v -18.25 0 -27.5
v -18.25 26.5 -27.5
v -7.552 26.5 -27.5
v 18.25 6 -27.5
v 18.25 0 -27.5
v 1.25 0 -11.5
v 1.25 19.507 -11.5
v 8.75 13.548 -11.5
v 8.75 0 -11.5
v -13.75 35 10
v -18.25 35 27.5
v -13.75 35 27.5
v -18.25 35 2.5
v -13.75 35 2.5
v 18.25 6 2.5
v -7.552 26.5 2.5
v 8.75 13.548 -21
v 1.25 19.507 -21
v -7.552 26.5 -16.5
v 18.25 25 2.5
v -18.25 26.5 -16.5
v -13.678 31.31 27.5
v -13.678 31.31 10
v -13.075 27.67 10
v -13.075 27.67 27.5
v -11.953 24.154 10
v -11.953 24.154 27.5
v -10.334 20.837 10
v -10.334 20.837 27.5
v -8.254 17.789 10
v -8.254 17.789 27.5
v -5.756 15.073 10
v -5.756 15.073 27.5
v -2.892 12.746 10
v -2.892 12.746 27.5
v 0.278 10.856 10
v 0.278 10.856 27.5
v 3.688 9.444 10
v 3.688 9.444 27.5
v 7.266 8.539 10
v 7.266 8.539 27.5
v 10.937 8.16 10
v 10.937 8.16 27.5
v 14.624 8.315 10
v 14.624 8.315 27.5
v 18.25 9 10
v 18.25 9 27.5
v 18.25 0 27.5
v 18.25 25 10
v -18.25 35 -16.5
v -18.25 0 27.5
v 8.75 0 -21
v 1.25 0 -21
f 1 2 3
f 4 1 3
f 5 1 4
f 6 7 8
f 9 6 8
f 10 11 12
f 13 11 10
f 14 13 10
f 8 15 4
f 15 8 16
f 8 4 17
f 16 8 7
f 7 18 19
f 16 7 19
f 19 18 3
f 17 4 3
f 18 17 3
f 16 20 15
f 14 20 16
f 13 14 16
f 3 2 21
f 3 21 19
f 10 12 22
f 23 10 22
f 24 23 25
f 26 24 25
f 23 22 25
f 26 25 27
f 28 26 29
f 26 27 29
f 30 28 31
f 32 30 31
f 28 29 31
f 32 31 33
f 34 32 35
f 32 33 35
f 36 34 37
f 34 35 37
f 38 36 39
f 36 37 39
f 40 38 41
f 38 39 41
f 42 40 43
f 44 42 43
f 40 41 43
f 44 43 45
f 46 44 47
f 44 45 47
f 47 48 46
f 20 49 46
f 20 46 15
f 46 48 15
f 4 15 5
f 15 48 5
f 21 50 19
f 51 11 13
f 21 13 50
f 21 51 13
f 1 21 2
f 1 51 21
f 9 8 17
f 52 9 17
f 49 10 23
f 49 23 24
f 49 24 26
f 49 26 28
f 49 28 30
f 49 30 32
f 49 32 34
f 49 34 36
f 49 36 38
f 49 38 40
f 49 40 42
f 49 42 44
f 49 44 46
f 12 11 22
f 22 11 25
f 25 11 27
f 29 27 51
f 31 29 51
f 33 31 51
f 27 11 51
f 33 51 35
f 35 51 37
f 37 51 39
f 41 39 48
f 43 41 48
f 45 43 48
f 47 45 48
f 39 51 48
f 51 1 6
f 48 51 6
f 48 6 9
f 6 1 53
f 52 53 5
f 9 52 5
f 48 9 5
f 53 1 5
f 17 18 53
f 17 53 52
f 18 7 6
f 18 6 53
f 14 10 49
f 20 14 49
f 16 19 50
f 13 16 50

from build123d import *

# Parameters (mm, degrees)
SKETCH1_W           = 36.5
SKETCH1_H           = 55
SKETCH1_W_2         = 7.5
SKETCH1_H_2         = 9.5
BOSS_EXTRUDE1_DEPTH = 35
SKETCH3_W           = 11
SKETCH3_H           = 11
CUT_EXTRUDE2_DEPTH  = 8.5
CUT_EXTRUDE1_DEPTH  = 30
CUT_EXTRUDE3_DEPTH  = 17.5
CUT_EXTRUDE4_REACH  = 39.5


with BuildPart() as part:
    # Sketch1 → Boss-Extrude1 (new body)
    with BuildSketch(Plane(origin=(0, 0, 0), x_dir=(1, 0, 0), z_dir=(0, 1, 0))):
        Rectangle(SKETCH1_W, SKETCH1_H)
        with Locations((5, 16.25)):
            Rectangle(SKETCH1_W_2, SKETCH1_H_2, mode=Mode.SUBTRACT)
    extrude(amount=BOSS_EXTRUDE1_DEPTH)

    # Sketch3 → Cut-Extrude2 (cut)
    with BuildSketch(Plane(origin=(0, 35, 0), x_dir=(1, 0, 0), z_dir=(0, 1, 0))):
        with Locations((-12.75, 22)):
            Rectangle(SKETCH3_W, SKETCH3_H)
    extrude(amount=-CUT_EXTRUDE2_DEPTH, mode=Mode.SUBTRACT)

    # Sketch2 → Cut-Extrude1 (cut)
    with BuildSketch(Plane(origin=(0, 0, -27.5), x_dir=(-1, 0, 0), z_dir=(0, 0, -1))):
        Polygon((7.551724138, 26.5), (18.25, 35), (7.25, 35), (7.25, 26.5), align=None)
        Polygon((-18.25, 6), (7.551724138, 26.5), (7.25, 26.5), (7.25, 35), (-18.25, 35), align=None)
    extrude(amount=-CUT_EXTRUDE1_DEPTH, mode=Mode.SUBTRACT)

    # Sketch4 → Cut-Extrude3 (cut)
    with BuildSketch(Plane.XY.offset(27.5)):
        with BuildLine():
            ThreePointArc((-13.75, 35), (-4.365969084, 13.85726882), (18.25, 9))
            Line((18.25, 9), (18.25, 35))
            Line((18.25, 35), (-13.75, 35))
        make_face()
    extrude(amount=-CUT_EXTRUDE3_DEPTH, mode=Mode.SUBTRACT)

    # Sketch5 → Cut-Extrude4 (cut, up to next)
    with BuildSketch(Plane.XY.offset(10), mode=Mode.PRIVATE) as cut_extrude4_sk1:
        Polygon((18.25, 35), (-13.75, 35), (18.25, 25), align=None)
    cut_extrude4_tool1 = extrude(cut_extrude4_sk1.sketch, amount=-CUT_EXTRUDE4_REACH, mode=Mode.PRIVATE) & part.part
    add(cut_extrude4_tool1.solids().sort_by_distance((7.583333, 31.666667, 10))[0], mode=Mode.SUBTRACT)


solid = part.part
